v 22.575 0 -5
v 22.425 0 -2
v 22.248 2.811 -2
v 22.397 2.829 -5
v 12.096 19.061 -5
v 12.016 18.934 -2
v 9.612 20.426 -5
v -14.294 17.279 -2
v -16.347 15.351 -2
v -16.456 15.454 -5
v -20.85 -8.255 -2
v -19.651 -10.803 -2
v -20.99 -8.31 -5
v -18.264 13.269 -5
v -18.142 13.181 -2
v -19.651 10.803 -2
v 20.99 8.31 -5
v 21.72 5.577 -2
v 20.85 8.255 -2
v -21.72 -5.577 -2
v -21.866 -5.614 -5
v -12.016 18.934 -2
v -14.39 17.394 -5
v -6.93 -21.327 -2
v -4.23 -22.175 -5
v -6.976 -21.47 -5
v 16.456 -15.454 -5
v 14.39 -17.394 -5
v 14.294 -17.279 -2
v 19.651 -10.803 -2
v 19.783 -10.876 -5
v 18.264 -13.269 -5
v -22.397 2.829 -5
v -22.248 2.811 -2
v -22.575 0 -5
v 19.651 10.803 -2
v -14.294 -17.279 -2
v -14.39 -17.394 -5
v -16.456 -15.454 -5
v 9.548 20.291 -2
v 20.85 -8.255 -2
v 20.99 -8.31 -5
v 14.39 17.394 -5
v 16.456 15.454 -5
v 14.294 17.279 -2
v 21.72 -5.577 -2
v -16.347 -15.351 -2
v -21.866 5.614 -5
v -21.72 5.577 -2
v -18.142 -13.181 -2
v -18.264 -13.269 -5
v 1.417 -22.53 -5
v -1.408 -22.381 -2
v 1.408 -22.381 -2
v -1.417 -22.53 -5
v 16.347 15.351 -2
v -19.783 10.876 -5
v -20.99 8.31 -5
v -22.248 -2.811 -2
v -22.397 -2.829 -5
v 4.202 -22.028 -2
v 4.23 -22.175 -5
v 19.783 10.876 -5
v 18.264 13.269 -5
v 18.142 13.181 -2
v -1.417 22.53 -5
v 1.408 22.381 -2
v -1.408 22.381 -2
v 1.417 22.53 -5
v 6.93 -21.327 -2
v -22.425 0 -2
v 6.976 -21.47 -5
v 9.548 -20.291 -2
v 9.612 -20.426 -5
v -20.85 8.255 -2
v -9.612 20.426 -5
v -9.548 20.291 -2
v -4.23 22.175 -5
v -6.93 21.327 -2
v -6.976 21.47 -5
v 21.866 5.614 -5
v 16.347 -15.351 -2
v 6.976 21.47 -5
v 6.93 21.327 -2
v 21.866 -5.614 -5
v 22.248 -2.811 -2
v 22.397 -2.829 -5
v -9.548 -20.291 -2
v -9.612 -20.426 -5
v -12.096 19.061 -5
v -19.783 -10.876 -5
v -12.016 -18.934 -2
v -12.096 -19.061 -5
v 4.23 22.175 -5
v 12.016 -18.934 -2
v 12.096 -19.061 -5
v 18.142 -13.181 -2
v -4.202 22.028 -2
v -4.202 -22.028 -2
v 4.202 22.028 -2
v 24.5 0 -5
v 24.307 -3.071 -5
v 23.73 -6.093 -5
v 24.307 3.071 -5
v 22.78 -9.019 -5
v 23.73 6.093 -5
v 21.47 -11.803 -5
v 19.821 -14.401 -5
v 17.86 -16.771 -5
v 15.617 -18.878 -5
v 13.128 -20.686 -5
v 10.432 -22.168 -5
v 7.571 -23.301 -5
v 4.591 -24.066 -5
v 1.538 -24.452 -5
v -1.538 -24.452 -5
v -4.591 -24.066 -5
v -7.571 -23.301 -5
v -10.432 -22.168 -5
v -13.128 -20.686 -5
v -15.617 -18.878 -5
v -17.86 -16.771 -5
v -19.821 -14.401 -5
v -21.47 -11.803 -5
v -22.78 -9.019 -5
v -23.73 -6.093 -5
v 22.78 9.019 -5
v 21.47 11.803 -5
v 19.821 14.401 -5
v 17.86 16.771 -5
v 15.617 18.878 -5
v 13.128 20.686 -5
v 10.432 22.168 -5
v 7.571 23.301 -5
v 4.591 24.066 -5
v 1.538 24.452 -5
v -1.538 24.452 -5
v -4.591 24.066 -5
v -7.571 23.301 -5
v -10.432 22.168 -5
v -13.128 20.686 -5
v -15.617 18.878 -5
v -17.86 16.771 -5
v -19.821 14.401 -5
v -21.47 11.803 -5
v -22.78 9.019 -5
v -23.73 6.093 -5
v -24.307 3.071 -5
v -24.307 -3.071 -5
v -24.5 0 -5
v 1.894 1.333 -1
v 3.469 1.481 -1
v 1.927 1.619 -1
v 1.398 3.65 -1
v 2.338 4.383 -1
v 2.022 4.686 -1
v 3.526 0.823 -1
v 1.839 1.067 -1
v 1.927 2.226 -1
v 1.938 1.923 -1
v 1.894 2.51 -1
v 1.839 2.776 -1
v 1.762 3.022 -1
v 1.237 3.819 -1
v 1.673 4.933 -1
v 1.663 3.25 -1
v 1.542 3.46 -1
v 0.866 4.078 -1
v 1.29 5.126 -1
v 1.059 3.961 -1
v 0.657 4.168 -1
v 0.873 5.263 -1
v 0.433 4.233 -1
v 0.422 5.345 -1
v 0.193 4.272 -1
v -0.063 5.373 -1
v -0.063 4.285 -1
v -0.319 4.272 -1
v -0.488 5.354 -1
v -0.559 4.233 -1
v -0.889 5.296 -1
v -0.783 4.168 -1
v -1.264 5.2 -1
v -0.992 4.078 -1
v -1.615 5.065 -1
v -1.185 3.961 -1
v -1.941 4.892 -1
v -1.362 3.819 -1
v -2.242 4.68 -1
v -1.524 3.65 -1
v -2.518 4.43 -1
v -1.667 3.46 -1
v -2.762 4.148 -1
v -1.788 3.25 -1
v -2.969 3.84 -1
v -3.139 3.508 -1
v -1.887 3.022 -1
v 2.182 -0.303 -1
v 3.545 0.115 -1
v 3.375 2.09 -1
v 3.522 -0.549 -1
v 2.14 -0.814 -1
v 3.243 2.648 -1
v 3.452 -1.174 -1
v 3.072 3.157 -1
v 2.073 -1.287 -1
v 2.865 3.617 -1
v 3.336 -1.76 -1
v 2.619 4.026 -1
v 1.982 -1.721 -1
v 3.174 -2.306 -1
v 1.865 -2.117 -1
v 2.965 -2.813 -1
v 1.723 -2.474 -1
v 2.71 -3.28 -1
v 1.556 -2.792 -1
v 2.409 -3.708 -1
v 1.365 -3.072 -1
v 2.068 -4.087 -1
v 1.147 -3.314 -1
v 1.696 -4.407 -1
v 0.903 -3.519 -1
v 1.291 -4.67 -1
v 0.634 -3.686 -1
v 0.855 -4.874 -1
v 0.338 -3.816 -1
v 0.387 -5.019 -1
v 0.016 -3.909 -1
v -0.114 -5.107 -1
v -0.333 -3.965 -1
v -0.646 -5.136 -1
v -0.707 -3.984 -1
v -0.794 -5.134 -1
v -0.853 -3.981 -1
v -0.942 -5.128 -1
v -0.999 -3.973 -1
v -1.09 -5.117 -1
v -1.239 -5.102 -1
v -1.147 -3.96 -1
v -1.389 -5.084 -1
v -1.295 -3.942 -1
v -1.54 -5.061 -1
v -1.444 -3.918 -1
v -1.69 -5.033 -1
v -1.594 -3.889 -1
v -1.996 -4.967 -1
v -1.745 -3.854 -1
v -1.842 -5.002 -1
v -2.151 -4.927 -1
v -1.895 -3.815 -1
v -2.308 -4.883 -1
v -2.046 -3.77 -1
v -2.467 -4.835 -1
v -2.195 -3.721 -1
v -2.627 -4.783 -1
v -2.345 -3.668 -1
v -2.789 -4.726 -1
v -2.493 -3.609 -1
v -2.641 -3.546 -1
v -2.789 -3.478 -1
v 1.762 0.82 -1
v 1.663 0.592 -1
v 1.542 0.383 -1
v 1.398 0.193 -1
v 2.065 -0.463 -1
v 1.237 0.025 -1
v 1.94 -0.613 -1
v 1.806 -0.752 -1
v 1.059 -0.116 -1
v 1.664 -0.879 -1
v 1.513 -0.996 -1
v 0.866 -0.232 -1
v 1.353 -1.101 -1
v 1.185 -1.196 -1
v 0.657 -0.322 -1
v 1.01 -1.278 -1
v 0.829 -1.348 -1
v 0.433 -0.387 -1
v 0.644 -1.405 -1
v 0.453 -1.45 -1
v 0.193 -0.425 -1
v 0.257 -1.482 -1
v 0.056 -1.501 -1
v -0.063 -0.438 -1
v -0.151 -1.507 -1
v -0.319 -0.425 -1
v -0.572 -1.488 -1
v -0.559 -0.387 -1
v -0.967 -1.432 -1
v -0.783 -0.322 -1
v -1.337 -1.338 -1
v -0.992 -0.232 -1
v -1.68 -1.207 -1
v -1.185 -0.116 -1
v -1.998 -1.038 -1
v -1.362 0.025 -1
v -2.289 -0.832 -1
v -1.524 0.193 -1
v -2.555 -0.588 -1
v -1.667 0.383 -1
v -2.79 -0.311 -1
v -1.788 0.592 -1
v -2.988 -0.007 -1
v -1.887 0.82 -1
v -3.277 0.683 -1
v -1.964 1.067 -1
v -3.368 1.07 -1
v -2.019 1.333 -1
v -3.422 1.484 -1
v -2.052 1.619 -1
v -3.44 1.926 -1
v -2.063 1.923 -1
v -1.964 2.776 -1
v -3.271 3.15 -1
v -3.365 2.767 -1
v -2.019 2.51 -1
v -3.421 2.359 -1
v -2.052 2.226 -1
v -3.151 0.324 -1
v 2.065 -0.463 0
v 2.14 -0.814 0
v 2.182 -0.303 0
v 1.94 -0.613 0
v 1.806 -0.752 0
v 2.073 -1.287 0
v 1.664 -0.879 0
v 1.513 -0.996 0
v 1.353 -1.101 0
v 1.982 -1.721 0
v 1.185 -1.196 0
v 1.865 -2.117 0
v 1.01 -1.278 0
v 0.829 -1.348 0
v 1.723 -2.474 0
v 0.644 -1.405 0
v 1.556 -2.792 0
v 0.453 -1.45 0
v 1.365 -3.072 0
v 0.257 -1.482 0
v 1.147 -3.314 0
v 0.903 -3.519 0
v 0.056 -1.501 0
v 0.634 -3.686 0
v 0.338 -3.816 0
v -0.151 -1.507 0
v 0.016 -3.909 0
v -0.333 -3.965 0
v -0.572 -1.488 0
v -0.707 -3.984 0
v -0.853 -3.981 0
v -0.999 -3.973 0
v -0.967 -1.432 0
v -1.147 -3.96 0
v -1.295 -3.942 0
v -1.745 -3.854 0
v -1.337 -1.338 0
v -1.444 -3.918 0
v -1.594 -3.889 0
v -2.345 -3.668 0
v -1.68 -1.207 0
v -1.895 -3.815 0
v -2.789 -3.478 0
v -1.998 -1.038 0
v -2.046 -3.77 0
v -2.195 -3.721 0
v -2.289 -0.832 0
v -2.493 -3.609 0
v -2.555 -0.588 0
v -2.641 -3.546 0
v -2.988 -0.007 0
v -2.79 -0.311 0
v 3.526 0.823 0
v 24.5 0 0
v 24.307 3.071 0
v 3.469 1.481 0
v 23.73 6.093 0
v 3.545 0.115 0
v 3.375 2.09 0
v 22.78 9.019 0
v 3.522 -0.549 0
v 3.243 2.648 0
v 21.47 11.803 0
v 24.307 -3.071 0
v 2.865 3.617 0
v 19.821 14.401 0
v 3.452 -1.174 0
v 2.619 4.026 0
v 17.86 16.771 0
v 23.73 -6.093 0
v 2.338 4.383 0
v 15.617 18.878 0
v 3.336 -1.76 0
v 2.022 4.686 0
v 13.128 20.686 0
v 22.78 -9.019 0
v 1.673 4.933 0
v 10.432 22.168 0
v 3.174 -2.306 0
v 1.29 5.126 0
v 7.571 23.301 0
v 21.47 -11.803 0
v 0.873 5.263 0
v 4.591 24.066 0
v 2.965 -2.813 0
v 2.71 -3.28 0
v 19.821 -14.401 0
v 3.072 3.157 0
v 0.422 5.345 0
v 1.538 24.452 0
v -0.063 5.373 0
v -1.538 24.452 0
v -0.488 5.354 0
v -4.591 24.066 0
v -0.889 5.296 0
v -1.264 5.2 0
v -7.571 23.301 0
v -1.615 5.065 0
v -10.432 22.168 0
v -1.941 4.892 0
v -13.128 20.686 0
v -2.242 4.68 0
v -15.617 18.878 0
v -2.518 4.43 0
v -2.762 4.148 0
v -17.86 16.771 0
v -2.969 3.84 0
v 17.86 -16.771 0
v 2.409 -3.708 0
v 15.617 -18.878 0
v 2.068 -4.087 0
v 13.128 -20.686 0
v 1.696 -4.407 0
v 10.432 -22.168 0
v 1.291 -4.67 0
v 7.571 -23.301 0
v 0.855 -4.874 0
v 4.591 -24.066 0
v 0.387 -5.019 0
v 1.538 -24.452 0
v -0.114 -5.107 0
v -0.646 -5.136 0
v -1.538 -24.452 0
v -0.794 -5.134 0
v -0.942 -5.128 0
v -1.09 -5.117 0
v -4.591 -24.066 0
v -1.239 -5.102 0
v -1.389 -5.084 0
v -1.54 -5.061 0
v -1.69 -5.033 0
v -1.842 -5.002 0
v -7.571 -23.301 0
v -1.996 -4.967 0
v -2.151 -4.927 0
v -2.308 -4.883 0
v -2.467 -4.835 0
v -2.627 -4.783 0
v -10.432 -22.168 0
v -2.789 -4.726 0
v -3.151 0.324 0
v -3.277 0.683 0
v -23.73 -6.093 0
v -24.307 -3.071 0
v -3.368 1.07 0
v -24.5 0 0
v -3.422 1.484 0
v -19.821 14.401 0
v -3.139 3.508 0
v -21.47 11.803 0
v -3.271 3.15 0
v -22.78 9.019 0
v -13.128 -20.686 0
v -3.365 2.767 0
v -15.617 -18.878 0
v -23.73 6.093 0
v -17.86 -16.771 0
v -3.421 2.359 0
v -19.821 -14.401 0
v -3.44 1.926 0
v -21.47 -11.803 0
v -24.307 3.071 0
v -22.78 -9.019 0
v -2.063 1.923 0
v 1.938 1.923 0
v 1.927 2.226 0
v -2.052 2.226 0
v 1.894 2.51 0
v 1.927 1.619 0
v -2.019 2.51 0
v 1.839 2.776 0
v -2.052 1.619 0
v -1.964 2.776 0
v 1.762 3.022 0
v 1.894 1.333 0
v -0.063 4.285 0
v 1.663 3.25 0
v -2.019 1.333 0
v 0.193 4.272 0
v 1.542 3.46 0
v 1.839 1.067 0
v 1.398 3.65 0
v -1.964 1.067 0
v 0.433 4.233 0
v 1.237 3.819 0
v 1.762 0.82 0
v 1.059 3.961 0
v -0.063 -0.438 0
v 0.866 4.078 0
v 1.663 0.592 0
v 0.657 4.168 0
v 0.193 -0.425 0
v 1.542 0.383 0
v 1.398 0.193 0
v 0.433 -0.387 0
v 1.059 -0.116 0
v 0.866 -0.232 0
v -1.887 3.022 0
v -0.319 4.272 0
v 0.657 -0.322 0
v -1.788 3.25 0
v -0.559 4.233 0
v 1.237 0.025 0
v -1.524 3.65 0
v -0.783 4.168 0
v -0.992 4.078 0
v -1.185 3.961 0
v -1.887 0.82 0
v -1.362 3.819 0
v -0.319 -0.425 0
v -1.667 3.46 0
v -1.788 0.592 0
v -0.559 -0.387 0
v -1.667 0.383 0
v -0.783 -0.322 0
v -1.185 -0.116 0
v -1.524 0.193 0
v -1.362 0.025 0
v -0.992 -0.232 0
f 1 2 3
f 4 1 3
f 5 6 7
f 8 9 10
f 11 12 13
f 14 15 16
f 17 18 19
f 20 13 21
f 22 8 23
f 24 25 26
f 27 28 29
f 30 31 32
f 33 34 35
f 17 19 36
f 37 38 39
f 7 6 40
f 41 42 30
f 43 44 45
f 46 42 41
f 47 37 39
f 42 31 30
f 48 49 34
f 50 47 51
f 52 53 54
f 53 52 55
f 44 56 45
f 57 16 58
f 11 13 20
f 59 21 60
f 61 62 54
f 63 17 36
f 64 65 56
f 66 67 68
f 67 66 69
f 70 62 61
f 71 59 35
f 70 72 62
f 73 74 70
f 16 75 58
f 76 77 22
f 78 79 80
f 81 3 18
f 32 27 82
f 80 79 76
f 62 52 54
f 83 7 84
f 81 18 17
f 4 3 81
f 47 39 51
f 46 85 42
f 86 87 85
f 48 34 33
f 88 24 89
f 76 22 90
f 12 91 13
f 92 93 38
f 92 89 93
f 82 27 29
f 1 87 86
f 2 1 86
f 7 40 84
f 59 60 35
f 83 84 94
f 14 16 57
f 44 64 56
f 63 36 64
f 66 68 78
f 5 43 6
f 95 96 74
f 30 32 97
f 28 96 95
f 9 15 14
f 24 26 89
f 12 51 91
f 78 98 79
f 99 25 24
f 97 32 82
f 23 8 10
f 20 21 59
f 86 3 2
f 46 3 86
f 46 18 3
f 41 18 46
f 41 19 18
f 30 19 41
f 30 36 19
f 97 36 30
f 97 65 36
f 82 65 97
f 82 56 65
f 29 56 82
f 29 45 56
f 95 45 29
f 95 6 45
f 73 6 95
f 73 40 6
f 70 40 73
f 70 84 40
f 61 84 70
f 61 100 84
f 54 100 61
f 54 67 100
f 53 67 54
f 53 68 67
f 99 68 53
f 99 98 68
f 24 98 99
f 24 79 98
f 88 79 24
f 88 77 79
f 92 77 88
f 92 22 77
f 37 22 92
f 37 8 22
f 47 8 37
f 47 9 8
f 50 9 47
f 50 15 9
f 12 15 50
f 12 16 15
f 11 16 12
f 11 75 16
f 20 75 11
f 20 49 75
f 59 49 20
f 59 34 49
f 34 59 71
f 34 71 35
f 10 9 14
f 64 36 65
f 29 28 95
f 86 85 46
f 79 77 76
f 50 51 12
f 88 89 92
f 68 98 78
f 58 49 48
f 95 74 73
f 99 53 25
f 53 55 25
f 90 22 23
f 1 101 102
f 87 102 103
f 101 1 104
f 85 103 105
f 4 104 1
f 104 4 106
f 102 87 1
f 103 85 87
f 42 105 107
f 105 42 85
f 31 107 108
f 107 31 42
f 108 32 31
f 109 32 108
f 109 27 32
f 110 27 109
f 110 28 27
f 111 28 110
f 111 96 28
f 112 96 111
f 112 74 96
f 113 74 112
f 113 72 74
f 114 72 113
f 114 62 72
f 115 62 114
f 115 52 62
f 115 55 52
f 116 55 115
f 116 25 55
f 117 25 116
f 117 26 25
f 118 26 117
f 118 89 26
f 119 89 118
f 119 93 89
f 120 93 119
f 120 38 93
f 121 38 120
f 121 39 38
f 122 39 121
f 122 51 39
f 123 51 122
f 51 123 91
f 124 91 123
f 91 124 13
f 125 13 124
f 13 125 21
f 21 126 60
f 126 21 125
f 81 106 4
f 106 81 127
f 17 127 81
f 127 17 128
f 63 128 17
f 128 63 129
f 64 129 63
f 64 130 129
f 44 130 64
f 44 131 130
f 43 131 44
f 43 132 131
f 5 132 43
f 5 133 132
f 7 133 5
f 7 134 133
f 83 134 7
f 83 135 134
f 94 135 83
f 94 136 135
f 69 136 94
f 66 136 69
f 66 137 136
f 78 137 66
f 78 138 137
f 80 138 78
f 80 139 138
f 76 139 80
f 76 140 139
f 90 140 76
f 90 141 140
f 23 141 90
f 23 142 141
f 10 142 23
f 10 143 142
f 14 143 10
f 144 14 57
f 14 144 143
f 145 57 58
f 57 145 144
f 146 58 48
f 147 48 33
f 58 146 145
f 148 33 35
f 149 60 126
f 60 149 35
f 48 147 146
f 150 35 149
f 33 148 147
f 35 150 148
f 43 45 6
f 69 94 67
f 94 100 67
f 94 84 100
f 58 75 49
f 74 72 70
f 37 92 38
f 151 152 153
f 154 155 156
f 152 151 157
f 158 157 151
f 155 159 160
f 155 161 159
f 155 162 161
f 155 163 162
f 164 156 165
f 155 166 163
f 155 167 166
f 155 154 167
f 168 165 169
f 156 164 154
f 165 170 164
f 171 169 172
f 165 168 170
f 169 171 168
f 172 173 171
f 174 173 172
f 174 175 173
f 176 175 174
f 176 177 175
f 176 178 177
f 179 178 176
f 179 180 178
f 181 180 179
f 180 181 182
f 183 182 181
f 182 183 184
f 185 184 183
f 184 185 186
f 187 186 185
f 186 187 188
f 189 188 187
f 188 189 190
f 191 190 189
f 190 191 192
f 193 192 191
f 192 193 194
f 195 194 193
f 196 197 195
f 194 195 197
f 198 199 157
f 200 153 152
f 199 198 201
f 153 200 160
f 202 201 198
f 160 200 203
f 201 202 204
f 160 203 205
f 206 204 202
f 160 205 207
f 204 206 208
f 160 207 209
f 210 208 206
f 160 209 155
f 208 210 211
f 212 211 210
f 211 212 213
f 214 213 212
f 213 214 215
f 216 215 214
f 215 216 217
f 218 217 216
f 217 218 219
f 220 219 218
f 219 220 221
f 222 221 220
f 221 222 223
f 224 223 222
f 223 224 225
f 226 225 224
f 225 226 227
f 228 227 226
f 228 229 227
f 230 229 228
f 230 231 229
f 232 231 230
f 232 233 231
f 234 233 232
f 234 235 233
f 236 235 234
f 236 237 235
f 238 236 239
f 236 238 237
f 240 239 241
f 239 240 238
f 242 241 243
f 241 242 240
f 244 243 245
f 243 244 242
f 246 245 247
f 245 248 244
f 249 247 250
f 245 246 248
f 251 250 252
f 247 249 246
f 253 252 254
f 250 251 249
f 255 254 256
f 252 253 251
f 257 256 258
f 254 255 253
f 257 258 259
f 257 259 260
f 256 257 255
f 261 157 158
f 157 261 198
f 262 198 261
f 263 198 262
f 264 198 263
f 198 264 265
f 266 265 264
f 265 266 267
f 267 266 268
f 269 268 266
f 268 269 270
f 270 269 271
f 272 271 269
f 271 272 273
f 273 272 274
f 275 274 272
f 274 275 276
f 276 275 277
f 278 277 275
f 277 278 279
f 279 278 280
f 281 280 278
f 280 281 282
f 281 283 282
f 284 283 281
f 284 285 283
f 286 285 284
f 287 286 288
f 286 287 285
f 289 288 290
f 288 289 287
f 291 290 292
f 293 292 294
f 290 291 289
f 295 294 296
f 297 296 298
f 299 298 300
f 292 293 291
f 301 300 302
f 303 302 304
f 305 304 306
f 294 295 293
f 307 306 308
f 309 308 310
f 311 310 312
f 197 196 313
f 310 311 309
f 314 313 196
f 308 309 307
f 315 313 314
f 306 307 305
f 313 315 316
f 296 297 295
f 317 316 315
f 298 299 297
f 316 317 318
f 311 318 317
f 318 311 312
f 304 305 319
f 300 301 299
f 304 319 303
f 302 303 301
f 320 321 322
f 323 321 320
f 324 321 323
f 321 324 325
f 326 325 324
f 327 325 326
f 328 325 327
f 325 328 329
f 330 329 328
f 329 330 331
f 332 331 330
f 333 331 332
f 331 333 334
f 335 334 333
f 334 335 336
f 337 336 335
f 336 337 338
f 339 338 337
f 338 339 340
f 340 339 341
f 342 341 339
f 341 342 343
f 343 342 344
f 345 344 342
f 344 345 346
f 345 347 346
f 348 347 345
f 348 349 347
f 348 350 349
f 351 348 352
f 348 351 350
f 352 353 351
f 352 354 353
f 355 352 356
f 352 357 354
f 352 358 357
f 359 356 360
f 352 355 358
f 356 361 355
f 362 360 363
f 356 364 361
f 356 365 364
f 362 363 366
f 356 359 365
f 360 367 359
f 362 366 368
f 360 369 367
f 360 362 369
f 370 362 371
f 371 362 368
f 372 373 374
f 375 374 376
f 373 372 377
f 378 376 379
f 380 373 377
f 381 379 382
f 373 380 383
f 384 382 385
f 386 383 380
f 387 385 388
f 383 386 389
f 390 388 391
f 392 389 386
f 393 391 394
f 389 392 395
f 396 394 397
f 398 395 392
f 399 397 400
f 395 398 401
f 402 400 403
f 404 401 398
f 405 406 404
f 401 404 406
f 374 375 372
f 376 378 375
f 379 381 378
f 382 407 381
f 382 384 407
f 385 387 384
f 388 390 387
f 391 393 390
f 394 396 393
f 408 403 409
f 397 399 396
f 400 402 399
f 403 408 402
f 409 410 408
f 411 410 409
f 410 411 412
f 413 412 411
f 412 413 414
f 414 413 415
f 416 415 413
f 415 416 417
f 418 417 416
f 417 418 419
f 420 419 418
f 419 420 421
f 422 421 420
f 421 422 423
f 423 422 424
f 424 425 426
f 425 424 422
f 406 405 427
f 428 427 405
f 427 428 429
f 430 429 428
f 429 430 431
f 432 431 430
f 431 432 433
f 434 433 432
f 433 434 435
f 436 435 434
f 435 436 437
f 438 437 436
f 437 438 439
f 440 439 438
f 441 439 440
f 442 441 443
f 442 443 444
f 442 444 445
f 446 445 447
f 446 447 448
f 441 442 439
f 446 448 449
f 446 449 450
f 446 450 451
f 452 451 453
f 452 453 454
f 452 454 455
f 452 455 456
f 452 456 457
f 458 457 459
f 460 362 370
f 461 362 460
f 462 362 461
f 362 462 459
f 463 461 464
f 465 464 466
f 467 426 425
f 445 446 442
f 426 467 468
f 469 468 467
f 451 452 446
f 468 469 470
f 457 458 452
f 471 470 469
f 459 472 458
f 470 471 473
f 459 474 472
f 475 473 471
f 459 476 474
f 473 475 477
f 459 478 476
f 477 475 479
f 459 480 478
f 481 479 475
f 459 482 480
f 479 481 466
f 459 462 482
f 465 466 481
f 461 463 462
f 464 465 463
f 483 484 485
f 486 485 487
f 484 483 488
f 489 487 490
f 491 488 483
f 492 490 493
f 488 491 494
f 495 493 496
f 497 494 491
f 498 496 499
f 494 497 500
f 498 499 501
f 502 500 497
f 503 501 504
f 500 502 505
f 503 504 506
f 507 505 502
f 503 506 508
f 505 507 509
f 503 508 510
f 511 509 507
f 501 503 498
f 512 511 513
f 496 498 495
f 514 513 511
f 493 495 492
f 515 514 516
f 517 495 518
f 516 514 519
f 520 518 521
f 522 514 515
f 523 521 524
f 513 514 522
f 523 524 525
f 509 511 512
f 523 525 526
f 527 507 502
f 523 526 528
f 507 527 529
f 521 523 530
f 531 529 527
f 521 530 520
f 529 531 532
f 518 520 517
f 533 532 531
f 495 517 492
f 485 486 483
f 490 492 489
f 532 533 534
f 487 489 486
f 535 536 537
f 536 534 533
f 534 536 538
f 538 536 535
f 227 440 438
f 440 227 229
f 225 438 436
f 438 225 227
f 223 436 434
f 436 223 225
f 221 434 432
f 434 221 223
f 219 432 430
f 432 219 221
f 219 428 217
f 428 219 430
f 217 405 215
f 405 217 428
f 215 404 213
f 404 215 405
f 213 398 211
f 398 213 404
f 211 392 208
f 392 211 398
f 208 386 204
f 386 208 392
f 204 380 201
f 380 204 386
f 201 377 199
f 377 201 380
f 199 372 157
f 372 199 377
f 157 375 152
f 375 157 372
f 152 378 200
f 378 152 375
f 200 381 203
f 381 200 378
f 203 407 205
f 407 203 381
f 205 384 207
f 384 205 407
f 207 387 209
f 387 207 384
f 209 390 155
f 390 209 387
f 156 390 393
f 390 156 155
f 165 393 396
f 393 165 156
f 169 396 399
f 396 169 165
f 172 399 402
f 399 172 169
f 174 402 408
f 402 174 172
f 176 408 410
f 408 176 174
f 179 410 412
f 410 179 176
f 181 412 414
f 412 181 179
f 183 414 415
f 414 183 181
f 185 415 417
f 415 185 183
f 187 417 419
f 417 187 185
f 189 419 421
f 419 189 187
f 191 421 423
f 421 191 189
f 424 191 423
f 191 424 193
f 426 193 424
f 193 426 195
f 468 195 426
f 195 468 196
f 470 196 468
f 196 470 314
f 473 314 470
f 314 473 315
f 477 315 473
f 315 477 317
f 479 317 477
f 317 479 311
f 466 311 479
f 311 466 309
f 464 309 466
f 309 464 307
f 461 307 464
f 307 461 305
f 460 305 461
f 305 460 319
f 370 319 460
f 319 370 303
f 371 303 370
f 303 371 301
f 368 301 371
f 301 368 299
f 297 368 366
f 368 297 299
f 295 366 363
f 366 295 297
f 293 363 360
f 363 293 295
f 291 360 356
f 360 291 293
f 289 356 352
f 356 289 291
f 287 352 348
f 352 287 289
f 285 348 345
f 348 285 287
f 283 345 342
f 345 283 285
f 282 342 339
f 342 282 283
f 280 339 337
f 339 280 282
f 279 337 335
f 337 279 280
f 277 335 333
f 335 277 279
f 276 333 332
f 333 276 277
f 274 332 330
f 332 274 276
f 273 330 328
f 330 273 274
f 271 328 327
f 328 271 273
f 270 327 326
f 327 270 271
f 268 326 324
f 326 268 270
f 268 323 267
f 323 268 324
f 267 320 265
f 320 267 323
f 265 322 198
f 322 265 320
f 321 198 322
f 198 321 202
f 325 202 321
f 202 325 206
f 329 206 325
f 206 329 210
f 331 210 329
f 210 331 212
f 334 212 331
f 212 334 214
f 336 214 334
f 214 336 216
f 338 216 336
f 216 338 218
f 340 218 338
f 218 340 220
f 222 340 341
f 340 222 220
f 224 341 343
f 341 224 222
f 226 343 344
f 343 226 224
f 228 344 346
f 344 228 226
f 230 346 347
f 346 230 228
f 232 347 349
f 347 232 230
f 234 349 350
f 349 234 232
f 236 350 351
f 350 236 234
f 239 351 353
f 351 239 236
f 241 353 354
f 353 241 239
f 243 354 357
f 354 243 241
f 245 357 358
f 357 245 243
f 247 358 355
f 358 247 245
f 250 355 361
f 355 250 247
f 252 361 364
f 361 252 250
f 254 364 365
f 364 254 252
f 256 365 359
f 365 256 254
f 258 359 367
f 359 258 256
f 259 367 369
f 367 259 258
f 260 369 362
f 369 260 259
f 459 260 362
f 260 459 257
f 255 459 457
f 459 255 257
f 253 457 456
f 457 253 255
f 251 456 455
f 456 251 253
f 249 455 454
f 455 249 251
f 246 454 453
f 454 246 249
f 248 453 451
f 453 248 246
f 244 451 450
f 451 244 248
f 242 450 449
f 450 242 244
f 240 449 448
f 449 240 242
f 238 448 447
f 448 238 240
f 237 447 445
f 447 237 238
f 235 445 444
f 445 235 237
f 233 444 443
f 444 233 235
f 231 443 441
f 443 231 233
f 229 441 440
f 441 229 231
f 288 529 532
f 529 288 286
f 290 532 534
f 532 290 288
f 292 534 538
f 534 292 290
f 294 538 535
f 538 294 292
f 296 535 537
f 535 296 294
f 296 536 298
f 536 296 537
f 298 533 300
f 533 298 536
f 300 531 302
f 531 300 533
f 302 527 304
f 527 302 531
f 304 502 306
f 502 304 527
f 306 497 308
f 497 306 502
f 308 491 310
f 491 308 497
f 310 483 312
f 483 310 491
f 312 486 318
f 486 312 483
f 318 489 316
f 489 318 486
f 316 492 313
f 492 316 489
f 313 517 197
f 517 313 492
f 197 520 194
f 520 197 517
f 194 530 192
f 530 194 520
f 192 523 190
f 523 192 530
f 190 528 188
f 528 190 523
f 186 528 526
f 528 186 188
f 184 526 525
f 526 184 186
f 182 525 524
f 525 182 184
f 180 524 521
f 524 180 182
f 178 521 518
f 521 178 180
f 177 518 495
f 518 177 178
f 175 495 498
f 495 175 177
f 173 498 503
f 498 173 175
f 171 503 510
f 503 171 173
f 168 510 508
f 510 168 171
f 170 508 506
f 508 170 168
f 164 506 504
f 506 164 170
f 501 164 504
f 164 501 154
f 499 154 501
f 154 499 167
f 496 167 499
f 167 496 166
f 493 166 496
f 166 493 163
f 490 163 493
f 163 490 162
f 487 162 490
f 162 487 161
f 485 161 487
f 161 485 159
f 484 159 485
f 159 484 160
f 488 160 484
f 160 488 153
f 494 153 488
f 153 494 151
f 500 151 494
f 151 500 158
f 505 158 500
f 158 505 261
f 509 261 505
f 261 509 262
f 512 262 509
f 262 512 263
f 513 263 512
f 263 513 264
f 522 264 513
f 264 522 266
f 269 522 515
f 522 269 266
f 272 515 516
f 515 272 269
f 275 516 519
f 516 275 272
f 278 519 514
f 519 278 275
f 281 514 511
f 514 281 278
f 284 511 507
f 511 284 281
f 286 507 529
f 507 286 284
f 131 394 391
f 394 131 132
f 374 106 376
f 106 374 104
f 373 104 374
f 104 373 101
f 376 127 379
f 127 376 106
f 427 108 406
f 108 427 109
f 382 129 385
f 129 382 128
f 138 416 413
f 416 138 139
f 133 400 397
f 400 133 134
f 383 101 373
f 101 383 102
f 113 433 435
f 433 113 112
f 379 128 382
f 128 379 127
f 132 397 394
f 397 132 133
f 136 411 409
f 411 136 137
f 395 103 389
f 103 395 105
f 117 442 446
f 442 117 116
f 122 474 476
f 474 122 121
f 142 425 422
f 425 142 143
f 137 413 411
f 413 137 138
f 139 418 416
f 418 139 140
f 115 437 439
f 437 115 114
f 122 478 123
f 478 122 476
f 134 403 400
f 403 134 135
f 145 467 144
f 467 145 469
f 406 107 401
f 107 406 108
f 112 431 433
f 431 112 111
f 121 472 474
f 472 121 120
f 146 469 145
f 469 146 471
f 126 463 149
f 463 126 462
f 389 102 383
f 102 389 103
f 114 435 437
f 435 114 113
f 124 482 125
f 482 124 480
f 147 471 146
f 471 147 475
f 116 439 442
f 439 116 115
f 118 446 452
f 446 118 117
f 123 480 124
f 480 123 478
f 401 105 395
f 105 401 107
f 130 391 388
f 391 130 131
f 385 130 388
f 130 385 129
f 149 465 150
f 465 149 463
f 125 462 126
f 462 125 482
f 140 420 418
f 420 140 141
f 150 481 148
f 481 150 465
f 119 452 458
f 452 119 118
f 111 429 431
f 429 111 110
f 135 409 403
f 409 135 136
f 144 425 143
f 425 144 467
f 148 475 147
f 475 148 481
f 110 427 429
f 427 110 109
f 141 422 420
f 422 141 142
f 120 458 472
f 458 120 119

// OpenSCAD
$fn = 50;

difference() {
	union() {
		translate(v = [0, 0, -5.0]) {
			cylinder(h = 5, r = 24.5);
		}
	}
	union() {
		#translate(v = [0, 0, -5.0]) {
			cylinder(h = 3, r1 = 22.575, r2 = 22.425);
		}
		translate(v = [0, 0, -1]) {
			linear_extrude(height = 1) {
				text(font = "Impact", halign = "center", size = 10, text = "9", valign = "center");
			}
		}
	}
}
